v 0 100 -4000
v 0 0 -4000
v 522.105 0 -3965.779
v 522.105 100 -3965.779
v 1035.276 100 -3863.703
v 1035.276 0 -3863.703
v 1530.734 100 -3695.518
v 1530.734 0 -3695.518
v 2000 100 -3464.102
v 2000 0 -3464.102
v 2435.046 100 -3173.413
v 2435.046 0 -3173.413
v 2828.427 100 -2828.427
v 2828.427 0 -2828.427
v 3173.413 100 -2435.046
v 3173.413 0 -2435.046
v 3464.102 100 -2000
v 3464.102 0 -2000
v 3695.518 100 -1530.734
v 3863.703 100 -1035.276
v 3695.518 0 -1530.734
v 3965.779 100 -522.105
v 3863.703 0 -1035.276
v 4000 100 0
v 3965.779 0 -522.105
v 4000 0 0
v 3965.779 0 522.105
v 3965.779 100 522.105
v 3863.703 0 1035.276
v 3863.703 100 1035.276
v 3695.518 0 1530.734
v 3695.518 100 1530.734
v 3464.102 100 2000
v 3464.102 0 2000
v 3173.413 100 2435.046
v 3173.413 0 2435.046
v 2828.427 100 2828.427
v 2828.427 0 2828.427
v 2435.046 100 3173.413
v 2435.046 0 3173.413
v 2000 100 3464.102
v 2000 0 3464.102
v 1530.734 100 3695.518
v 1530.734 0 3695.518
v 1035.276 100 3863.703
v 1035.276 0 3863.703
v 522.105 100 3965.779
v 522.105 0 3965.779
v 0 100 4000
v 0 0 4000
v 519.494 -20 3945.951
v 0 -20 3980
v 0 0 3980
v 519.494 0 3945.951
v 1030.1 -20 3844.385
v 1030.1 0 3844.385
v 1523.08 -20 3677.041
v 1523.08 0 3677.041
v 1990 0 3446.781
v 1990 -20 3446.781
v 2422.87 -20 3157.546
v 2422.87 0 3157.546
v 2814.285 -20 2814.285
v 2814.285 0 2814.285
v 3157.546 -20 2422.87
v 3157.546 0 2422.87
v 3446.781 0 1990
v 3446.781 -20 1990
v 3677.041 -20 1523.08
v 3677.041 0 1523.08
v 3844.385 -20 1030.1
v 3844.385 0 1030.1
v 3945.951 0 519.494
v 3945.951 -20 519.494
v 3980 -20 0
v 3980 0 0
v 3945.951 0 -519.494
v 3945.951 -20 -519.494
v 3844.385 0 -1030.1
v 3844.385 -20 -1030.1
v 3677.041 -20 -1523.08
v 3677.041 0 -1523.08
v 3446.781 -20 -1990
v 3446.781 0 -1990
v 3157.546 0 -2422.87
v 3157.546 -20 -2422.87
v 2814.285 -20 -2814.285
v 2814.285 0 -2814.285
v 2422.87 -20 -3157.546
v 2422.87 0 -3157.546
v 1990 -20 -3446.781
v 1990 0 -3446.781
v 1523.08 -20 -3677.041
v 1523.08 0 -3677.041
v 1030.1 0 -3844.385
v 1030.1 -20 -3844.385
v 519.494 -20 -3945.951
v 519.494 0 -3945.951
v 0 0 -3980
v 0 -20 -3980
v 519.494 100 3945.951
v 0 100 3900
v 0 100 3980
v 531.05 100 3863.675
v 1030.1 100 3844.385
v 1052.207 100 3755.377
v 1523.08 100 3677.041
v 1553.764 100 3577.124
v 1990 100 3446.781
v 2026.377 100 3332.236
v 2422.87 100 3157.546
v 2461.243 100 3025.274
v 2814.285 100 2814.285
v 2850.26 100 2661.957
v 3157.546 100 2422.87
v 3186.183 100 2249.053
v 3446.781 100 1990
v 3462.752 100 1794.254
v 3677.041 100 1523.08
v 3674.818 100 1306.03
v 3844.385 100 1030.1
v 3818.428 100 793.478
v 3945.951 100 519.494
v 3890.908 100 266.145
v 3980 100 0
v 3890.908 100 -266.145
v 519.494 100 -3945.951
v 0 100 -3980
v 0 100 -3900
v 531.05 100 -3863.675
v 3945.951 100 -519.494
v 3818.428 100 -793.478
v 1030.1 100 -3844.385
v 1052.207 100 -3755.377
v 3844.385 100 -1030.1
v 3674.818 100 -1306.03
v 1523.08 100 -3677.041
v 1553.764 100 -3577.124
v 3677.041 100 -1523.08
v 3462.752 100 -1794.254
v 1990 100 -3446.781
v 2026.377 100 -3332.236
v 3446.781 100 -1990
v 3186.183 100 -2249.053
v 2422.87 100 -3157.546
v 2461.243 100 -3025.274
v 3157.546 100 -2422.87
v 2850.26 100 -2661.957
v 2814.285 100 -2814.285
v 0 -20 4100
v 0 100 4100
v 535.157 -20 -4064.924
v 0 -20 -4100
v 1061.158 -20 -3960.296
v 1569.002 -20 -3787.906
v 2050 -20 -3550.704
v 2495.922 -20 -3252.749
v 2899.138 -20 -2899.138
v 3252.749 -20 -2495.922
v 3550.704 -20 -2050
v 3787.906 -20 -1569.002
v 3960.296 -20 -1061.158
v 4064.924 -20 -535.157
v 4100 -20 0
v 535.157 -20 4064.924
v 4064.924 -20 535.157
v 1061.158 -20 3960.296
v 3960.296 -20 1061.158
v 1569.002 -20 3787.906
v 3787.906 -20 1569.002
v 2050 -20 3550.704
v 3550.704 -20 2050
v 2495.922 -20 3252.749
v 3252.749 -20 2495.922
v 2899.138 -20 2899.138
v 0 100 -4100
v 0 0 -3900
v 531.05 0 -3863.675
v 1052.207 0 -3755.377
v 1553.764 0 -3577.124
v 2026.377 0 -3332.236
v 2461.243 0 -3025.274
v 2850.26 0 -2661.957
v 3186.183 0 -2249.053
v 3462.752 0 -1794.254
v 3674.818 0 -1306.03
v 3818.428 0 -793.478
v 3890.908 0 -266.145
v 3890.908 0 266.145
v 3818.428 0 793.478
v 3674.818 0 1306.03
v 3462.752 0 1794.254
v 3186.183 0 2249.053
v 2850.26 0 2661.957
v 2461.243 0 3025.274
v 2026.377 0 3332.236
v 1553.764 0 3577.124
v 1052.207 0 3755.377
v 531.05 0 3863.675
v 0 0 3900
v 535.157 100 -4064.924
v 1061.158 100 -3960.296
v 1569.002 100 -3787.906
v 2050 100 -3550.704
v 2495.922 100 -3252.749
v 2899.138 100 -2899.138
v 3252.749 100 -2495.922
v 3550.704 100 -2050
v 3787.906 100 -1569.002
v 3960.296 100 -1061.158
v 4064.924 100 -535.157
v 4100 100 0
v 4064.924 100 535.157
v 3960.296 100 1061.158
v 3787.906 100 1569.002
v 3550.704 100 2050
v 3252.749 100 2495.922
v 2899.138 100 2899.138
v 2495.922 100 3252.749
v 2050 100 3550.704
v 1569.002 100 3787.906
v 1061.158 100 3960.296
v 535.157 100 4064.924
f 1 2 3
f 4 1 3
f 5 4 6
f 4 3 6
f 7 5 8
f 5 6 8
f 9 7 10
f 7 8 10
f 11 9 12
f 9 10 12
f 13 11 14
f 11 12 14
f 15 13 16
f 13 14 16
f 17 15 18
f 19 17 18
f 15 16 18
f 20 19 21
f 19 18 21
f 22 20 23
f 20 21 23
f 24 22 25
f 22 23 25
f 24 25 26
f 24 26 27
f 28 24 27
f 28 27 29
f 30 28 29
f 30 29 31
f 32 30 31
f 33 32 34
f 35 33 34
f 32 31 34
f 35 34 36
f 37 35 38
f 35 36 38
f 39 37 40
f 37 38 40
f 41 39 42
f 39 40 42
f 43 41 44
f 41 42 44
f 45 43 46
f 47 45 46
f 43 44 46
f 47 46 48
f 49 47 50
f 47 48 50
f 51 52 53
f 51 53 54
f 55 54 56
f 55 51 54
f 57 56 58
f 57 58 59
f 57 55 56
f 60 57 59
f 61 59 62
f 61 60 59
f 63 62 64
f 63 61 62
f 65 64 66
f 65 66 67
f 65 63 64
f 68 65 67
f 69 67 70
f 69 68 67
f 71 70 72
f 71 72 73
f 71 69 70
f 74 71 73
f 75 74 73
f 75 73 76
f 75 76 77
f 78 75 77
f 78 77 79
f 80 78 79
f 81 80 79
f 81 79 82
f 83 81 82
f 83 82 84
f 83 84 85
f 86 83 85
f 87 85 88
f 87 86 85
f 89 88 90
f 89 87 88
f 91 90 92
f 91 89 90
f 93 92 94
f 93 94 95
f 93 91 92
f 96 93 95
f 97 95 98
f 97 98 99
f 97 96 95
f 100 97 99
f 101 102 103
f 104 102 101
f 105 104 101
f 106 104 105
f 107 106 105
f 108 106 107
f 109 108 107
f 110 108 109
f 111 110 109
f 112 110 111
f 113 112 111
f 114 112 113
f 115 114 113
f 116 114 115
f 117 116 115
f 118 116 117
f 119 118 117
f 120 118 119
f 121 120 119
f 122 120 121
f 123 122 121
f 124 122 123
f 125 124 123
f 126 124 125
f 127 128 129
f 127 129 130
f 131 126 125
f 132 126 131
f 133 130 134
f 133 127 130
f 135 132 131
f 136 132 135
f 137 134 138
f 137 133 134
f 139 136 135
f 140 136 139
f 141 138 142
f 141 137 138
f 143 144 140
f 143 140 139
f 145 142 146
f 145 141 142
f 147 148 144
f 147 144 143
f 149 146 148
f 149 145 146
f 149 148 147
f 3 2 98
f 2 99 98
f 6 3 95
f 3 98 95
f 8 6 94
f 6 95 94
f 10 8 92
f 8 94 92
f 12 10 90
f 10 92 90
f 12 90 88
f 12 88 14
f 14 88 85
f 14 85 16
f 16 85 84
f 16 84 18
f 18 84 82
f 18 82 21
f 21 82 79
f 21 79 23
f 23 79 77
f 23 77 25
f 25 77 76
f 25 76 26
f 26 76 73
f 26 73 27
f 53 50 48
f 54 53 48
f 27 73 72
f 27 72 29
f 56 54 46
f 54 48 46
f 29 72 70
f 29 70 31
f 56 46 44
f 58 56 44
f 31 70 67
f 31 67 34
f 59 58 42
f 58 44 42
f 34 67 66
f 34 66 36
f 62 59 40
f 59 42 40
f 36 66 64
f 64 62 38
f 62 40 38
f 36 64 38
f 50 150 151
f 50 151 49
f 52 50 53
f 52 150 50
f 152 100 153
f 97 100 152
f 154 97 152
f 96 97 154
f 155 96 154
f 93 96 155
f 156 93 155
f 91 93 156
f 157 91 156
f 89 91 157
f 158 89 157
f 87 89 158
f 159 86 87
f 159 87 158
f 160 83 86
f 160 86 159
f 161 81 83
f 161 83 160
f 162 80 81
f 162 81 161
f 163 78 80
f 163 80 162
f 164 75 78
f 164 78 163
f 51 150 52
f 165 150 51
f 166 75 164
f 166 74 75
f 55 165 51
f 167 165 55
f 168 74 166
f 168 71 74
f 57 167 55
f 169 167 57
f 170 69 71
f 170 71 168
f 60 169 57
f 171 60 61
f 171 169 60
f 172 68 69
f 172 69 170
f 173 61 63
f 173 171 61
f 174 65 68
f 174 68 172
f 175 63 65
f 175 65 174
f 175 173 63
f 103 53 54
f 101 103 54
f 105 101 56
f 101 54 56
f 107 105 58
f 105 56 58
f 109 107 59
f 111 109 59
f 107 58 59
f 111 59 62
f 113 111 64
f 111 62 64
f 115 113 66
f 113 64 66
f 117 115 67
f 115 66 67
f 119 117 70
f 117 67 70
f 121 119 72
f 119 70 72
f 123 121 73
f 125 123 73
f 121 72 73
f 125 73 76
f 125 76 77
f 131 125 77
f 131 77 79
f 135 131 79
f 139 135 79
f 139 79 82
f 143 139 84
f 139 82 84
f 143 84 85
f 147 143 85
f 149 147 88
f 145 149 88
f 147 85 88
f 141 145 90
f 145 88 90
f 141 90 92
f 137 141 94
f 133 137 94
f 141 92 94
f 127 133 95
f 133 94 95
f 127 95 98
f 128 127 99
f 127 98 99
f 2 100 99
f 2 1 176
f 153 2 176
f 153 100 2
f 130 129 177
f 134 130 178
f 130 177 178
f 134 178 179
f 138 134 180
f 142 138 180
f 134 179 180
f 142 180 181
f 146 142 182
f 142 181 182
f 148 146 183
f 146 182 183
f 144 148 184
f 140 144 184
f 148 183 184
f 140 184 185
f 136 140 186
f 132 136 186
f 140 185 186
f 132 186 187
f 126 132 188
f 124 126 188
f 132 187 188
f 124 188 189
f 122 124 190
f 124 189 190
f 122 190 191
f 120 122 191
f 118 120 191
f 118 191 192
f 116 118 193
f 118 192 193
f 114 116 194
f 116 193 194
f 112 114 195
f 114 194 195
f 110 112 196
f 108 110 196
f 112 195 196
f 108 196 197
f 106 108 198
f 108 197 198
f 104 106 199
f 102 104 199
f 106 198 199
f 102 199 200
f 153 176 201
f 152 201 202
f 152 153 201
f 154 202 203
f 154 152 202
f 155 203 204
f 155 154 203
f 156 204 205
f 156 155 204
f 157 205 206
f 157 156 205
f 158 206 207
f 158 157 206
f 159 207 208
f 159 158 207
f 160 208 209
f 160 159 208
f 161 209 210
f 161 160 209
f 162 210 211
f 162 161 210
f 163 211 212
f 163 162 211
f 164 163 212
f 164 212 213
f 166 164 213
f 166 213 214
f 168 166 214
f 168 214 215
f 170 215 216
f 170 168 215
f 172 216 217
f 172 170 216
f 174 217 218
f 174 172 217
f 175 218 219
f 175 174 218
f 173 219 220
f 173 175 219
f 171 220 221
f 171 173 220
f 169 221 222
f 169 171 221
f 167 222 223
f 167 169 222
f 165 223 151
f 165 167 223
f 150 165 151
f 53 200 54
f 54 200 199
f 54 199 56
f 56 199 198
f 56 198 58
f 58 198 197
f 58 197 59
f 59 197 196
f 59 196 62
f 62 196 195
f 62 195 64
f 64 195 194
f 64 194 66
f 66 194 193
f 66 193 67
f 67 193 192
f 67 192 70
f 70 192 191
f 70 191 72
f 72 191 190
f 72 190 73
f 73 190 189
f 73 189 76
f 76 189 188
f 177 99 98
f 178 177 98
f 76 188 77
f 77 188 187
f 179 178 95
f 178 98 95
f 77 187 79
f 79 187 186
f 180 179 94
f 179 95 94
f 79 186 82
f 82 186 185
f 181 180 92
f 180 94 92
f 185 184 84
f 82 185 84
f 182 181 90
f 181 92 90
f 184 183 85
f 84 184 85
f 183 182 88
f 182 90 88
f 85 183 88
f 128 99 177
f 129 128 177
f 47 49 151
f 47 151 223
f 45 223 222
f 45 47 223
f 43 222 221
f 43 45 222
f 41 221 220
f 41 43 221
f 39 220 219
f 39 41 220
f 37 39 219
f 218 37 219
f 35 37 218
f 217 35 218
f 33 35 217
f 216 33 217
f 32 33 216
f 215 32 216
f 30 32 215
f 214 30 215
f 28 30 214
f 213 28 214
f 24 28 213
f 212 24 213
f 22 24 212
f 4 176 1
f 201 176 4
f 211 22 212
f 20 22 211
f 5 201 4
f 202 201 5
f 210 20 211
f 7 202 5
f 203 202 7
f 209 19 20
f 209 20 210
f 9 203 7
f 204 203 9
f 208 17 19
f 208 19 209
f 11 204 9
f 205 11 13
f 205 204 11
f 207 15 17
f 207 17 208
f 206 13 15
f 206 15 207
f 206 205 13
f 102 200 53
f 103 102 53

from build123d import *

# Parameters (mm, degrees)
BOSS_EXTRUDE1_DEPTH   = 100
BOSS_EXTRUDE1_2_DEPTH = 100
BOSS_EXTRUDE2_START   = 20
BOSS_EXTRUDE2_DEPTH   = 20


with BuildPart() as part:
    # Sketch1 → Boss-Extrude1 (new body)
    with BuildSketch(Plane(origin=(0, 0, 0), x_dir=(1, 0, 0), z_dir=(0, 1, 0))):
        with BuildLine():
            ThreePointArc((4100, 0), (2899.137802865, 2899.137802865), (0, 4100))
            Line((0, 4100), (0, 4000))
            ThreePointArc((0, 4000), (2828.427124746, 2828.427124746), (4000, 0))
            ThreePointArc((4000, 0), (2828.427124746, -2828.427124746), (0, -4000))
            Line((0, -4000), (0, -4100))
            ThreePointArc((0, -4100), (2899.137802865, -2899.137802865), (4100, 0))
        make_face()
    extrude(amount=BOSS_EXTRUDE1_DEPTH)

    # Sketch2 → Boss-Extrude2 (add)
    with BuildSketch(Plane.XZ.offset(BOSS_EXTRUDE2_START)):
        with BuildLine():
            ThreePointArc((4100, 0), (2899.137802865, 2899.137802865), (0, 4100))
            Line((0, 4100), (0, 3980))
            ThreePointArc((0, 3980), (3980, 0), (0, -3980))
            Line((0, -3980), (0, -4100))
            ThreePointArc((0, -4100), (2899.137802865, -2899.137802865), (4100, 0))
        make_face()
    extrude(amount=-BOSS_EXTRUDE2_DEPTH)


with BuildPart() as body_2:
    # Sketch1 → Boss-Extrude1 2 (new body)
    with BuildSketch(Plane(origin=(0, 0, 0), x_dir=(1, 0, 0), z_dir=(0, 1, 0))):
        with BuildLine():
            ThreePointArc((3980, 0), (2814.284989123, 2814.284989122), (0, 3980))
            Line((0, 3980), (0, 3900))
            ThreePointArc((0, 3900), (2757.716446628, 2757.716446627), (3900, 0))
            ThreePointArc((3900, 0), (2757.716446628, -2757.716446627), (0, -3900))
            Line((0, -3900), (0, -3980))
            ThreePointArc((0, -3980), (2814.284989123, -2814.284989122), (3980, 0))
        make_face()
    extrude(amount=BOSS_EXTRUDE1_2_DEPTH)


solid = Compound([part.part, body_2.part])
